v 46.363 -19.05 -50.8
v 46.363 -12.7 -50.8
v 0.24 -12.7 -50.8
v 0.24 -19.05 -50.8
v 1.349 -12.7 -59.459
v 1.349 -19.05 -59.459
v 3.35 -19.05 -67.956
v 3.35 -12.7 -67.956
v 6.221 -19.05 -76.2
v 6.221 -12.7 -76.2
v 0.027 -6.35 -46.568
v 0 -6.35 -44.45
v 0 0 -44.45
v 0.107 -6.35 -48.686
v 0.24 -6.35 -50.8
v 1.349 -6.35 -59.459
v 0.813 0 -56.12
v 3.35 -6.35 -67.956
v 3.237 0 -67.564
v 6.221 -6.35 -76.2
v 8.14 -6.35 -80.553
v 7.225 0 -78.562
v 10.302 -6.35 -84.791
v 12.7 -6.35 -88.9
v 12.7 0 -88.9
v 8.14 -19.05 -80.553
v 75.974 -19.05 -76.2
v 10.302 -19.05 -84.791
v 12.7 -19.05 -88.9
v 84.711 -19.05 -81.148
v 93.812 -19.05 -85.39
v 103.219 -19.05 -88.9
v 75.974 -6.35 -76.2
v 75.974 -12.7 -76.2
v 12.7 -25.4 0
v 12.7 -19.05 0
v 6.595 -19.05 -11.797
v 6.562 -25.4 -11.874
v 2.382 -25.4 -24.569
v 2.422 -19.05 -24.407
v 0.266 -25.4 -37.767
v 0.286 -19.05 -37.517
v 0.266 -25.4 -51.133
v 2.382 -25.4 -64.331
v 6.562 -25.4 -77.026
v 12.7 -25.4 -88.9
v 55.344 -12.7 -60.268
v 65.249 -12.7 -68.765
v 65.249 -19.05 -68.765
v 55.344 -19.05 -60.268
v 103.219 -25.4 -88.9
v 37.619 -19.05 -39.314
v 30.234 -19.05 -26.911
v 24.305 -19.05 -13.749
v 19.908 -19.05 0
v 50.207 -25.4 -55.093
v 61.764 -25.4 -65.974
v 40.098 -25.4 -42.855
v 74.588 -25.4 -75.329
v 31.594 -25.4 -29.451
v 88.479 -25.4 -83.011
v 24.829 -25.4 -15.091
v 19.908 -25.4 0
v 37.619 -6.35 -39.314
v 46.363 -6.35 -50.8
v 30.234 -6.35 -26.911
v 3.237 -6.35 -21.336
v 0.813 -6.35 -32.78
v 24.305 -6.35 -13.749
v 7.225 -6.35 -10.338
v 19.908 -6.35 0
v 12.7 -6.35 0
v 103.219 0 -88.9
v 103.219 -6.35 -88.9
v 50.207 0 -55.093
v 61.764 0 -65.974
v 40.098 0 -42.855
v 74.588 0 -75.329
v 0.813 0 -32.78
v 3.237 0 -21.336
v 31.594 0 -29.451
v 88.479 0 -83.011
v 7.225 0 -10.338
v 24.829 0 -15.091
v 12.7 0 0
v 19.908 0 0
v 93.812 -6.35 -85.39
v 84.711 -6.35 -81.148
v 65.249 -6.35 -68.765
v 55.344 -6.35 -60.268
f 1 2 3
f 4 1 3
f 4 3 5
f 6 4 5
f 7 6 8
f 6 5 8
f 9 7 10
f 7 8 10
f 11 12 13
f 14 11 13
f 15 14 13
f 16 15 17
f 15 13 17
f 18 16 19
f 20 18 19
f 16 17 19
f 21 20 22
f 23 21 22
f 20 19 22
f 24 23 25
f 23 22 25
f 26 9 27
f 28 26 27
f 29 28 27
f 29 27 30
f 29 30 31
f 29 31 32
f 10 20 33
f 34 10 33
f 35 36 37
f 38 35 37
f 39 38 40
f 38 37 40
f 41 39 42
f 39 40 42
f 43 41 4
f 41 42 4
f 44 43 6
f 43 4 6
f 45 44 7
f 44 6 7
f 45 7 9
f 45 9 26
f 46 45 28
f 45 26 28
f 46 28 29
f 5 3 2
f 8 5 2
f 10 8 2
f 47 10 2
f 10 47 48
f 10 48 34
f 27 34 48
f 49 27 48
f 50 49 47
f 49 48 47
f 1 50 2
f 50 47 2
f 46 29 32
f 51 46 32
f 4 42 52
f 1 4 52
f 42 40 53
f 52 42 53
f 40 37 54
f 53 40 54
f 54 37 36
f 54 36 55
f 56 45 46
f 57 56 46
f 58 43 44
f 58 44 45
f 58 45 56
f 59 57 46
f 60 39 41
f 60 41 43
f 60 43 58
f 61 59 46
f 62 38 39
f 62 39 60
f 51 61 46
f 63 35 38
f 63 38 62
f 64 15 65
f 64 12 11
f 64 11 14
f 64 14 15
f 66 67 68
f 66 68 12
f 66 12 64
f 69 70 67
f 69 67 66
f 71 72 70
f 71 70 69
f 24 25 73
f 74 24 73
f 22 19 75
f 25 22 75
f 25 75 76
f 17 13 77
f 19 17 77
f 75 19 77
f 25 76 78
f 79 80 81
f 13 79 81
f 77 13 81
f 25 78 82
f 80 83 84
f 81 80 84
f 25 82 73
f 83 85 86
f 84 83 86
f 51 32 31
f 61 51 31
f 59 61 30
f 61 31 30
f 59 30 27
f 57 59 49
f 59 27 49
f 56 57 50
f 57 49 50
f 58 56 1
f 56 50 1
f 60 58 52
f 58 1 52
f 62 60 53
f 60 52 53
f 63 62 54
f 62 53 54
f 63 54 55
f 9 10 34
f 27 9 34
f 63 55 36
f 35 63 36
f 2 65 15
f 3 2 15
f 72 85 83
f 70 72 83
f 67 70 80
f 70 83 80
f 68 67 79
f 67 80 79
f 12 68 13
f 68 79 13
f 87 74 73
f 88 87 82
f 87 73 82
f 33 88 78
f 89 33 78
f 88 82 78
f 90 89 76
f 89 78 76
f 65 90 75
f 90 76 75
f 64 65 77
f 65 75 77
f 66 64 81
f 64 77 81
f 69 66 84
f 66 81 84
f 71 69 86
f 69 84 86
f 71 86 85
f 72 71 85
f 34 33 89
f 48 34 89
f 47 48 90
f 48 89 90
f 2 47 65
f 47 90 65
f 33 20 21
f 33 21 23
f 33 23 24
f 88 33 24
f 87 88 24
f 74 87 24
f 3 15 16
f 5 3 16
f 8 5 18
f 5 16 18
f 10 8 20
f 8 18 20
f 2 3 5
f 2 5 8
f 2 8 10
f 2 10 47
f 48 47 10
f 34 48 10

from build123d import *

# Parameters (mm, degrees)
F1_DEPTH = 6.35
F3_DEPTH = 6.35
F4_DEPTH = 6.35
F6_DEPTH = 6.35


with BuildPart() as f1:
    # F0 (on Front) → F1 (new body)
    with BuildSketch(Plane.XZ):
        with BuildLine():
            ThreePointArc((103.2192627102, -88.9), (50.2069949475, -55.0926211004), (19.9077787579, 0))
            Line((19.9077787579, 0), (12.7, 0))
            ThreePointArc((12.7, 0), (3.2372788554, -21.3356511015), (0, -44.45))
            ThreePointArc((0, -44.45), (3.2372788554, -67.5643488985), (12.7, -88.9))
            Line((12.7, -88.9), (103.2192627102, -88.9))
        make_face()
    extrude(amount=F1_DEPTH)

    # F2 (on face) → F3 (join)
    with BuildSketch(Plane.XZ.offset(6.35)):
        with BuildLine():
            ThreePointArc((0.2399648381, -50.8), (2.2395472881, -63.7332634128), (6.220515932, -76.2))
            Line((6.220515932, -76.2), (75.9735986694, -76.2))
            ThreePointArc((75.9735986694, -76.2), (60.1873595892, -64.6437452498), (46.3633556248, -50.8))
            Line((46.3633556248, -50.8), (0.2399648381, -50.8))
        make_face()
    extrude(amount=F3_DEPTH)


with BuildPart() as f4:
    # F4 (new): a face of the model
    f4_faces = [f1.part.faces().sort_by_distance(p)[0] for p in [
        (31.6809192164, -12.7, -64.3648284456),
    ]]
    extrude(f4_faces, amount=F4_DEPTH)

    # F5 (on face) → F6 (join)
    with BuildSketch(Plane.XZ.offset(19.05)):
        with BuildLine():
            Line((19.9077787579, 0), (12.7, 0))
            ThreePointArc((12.7, 0), (0, -44.45), (12.7, -88.9))
            Line((12.7, -88.9), (103.2192627102, -88.9))
            ThreePointArc((103.2192627102, -88.9), (50.2069949475, -55.0926211004), (19.9077787579, 0))
        make_face()
    extrude(amount=F6_DEPTH)


solid = Compound([f1.part, f4.part])
